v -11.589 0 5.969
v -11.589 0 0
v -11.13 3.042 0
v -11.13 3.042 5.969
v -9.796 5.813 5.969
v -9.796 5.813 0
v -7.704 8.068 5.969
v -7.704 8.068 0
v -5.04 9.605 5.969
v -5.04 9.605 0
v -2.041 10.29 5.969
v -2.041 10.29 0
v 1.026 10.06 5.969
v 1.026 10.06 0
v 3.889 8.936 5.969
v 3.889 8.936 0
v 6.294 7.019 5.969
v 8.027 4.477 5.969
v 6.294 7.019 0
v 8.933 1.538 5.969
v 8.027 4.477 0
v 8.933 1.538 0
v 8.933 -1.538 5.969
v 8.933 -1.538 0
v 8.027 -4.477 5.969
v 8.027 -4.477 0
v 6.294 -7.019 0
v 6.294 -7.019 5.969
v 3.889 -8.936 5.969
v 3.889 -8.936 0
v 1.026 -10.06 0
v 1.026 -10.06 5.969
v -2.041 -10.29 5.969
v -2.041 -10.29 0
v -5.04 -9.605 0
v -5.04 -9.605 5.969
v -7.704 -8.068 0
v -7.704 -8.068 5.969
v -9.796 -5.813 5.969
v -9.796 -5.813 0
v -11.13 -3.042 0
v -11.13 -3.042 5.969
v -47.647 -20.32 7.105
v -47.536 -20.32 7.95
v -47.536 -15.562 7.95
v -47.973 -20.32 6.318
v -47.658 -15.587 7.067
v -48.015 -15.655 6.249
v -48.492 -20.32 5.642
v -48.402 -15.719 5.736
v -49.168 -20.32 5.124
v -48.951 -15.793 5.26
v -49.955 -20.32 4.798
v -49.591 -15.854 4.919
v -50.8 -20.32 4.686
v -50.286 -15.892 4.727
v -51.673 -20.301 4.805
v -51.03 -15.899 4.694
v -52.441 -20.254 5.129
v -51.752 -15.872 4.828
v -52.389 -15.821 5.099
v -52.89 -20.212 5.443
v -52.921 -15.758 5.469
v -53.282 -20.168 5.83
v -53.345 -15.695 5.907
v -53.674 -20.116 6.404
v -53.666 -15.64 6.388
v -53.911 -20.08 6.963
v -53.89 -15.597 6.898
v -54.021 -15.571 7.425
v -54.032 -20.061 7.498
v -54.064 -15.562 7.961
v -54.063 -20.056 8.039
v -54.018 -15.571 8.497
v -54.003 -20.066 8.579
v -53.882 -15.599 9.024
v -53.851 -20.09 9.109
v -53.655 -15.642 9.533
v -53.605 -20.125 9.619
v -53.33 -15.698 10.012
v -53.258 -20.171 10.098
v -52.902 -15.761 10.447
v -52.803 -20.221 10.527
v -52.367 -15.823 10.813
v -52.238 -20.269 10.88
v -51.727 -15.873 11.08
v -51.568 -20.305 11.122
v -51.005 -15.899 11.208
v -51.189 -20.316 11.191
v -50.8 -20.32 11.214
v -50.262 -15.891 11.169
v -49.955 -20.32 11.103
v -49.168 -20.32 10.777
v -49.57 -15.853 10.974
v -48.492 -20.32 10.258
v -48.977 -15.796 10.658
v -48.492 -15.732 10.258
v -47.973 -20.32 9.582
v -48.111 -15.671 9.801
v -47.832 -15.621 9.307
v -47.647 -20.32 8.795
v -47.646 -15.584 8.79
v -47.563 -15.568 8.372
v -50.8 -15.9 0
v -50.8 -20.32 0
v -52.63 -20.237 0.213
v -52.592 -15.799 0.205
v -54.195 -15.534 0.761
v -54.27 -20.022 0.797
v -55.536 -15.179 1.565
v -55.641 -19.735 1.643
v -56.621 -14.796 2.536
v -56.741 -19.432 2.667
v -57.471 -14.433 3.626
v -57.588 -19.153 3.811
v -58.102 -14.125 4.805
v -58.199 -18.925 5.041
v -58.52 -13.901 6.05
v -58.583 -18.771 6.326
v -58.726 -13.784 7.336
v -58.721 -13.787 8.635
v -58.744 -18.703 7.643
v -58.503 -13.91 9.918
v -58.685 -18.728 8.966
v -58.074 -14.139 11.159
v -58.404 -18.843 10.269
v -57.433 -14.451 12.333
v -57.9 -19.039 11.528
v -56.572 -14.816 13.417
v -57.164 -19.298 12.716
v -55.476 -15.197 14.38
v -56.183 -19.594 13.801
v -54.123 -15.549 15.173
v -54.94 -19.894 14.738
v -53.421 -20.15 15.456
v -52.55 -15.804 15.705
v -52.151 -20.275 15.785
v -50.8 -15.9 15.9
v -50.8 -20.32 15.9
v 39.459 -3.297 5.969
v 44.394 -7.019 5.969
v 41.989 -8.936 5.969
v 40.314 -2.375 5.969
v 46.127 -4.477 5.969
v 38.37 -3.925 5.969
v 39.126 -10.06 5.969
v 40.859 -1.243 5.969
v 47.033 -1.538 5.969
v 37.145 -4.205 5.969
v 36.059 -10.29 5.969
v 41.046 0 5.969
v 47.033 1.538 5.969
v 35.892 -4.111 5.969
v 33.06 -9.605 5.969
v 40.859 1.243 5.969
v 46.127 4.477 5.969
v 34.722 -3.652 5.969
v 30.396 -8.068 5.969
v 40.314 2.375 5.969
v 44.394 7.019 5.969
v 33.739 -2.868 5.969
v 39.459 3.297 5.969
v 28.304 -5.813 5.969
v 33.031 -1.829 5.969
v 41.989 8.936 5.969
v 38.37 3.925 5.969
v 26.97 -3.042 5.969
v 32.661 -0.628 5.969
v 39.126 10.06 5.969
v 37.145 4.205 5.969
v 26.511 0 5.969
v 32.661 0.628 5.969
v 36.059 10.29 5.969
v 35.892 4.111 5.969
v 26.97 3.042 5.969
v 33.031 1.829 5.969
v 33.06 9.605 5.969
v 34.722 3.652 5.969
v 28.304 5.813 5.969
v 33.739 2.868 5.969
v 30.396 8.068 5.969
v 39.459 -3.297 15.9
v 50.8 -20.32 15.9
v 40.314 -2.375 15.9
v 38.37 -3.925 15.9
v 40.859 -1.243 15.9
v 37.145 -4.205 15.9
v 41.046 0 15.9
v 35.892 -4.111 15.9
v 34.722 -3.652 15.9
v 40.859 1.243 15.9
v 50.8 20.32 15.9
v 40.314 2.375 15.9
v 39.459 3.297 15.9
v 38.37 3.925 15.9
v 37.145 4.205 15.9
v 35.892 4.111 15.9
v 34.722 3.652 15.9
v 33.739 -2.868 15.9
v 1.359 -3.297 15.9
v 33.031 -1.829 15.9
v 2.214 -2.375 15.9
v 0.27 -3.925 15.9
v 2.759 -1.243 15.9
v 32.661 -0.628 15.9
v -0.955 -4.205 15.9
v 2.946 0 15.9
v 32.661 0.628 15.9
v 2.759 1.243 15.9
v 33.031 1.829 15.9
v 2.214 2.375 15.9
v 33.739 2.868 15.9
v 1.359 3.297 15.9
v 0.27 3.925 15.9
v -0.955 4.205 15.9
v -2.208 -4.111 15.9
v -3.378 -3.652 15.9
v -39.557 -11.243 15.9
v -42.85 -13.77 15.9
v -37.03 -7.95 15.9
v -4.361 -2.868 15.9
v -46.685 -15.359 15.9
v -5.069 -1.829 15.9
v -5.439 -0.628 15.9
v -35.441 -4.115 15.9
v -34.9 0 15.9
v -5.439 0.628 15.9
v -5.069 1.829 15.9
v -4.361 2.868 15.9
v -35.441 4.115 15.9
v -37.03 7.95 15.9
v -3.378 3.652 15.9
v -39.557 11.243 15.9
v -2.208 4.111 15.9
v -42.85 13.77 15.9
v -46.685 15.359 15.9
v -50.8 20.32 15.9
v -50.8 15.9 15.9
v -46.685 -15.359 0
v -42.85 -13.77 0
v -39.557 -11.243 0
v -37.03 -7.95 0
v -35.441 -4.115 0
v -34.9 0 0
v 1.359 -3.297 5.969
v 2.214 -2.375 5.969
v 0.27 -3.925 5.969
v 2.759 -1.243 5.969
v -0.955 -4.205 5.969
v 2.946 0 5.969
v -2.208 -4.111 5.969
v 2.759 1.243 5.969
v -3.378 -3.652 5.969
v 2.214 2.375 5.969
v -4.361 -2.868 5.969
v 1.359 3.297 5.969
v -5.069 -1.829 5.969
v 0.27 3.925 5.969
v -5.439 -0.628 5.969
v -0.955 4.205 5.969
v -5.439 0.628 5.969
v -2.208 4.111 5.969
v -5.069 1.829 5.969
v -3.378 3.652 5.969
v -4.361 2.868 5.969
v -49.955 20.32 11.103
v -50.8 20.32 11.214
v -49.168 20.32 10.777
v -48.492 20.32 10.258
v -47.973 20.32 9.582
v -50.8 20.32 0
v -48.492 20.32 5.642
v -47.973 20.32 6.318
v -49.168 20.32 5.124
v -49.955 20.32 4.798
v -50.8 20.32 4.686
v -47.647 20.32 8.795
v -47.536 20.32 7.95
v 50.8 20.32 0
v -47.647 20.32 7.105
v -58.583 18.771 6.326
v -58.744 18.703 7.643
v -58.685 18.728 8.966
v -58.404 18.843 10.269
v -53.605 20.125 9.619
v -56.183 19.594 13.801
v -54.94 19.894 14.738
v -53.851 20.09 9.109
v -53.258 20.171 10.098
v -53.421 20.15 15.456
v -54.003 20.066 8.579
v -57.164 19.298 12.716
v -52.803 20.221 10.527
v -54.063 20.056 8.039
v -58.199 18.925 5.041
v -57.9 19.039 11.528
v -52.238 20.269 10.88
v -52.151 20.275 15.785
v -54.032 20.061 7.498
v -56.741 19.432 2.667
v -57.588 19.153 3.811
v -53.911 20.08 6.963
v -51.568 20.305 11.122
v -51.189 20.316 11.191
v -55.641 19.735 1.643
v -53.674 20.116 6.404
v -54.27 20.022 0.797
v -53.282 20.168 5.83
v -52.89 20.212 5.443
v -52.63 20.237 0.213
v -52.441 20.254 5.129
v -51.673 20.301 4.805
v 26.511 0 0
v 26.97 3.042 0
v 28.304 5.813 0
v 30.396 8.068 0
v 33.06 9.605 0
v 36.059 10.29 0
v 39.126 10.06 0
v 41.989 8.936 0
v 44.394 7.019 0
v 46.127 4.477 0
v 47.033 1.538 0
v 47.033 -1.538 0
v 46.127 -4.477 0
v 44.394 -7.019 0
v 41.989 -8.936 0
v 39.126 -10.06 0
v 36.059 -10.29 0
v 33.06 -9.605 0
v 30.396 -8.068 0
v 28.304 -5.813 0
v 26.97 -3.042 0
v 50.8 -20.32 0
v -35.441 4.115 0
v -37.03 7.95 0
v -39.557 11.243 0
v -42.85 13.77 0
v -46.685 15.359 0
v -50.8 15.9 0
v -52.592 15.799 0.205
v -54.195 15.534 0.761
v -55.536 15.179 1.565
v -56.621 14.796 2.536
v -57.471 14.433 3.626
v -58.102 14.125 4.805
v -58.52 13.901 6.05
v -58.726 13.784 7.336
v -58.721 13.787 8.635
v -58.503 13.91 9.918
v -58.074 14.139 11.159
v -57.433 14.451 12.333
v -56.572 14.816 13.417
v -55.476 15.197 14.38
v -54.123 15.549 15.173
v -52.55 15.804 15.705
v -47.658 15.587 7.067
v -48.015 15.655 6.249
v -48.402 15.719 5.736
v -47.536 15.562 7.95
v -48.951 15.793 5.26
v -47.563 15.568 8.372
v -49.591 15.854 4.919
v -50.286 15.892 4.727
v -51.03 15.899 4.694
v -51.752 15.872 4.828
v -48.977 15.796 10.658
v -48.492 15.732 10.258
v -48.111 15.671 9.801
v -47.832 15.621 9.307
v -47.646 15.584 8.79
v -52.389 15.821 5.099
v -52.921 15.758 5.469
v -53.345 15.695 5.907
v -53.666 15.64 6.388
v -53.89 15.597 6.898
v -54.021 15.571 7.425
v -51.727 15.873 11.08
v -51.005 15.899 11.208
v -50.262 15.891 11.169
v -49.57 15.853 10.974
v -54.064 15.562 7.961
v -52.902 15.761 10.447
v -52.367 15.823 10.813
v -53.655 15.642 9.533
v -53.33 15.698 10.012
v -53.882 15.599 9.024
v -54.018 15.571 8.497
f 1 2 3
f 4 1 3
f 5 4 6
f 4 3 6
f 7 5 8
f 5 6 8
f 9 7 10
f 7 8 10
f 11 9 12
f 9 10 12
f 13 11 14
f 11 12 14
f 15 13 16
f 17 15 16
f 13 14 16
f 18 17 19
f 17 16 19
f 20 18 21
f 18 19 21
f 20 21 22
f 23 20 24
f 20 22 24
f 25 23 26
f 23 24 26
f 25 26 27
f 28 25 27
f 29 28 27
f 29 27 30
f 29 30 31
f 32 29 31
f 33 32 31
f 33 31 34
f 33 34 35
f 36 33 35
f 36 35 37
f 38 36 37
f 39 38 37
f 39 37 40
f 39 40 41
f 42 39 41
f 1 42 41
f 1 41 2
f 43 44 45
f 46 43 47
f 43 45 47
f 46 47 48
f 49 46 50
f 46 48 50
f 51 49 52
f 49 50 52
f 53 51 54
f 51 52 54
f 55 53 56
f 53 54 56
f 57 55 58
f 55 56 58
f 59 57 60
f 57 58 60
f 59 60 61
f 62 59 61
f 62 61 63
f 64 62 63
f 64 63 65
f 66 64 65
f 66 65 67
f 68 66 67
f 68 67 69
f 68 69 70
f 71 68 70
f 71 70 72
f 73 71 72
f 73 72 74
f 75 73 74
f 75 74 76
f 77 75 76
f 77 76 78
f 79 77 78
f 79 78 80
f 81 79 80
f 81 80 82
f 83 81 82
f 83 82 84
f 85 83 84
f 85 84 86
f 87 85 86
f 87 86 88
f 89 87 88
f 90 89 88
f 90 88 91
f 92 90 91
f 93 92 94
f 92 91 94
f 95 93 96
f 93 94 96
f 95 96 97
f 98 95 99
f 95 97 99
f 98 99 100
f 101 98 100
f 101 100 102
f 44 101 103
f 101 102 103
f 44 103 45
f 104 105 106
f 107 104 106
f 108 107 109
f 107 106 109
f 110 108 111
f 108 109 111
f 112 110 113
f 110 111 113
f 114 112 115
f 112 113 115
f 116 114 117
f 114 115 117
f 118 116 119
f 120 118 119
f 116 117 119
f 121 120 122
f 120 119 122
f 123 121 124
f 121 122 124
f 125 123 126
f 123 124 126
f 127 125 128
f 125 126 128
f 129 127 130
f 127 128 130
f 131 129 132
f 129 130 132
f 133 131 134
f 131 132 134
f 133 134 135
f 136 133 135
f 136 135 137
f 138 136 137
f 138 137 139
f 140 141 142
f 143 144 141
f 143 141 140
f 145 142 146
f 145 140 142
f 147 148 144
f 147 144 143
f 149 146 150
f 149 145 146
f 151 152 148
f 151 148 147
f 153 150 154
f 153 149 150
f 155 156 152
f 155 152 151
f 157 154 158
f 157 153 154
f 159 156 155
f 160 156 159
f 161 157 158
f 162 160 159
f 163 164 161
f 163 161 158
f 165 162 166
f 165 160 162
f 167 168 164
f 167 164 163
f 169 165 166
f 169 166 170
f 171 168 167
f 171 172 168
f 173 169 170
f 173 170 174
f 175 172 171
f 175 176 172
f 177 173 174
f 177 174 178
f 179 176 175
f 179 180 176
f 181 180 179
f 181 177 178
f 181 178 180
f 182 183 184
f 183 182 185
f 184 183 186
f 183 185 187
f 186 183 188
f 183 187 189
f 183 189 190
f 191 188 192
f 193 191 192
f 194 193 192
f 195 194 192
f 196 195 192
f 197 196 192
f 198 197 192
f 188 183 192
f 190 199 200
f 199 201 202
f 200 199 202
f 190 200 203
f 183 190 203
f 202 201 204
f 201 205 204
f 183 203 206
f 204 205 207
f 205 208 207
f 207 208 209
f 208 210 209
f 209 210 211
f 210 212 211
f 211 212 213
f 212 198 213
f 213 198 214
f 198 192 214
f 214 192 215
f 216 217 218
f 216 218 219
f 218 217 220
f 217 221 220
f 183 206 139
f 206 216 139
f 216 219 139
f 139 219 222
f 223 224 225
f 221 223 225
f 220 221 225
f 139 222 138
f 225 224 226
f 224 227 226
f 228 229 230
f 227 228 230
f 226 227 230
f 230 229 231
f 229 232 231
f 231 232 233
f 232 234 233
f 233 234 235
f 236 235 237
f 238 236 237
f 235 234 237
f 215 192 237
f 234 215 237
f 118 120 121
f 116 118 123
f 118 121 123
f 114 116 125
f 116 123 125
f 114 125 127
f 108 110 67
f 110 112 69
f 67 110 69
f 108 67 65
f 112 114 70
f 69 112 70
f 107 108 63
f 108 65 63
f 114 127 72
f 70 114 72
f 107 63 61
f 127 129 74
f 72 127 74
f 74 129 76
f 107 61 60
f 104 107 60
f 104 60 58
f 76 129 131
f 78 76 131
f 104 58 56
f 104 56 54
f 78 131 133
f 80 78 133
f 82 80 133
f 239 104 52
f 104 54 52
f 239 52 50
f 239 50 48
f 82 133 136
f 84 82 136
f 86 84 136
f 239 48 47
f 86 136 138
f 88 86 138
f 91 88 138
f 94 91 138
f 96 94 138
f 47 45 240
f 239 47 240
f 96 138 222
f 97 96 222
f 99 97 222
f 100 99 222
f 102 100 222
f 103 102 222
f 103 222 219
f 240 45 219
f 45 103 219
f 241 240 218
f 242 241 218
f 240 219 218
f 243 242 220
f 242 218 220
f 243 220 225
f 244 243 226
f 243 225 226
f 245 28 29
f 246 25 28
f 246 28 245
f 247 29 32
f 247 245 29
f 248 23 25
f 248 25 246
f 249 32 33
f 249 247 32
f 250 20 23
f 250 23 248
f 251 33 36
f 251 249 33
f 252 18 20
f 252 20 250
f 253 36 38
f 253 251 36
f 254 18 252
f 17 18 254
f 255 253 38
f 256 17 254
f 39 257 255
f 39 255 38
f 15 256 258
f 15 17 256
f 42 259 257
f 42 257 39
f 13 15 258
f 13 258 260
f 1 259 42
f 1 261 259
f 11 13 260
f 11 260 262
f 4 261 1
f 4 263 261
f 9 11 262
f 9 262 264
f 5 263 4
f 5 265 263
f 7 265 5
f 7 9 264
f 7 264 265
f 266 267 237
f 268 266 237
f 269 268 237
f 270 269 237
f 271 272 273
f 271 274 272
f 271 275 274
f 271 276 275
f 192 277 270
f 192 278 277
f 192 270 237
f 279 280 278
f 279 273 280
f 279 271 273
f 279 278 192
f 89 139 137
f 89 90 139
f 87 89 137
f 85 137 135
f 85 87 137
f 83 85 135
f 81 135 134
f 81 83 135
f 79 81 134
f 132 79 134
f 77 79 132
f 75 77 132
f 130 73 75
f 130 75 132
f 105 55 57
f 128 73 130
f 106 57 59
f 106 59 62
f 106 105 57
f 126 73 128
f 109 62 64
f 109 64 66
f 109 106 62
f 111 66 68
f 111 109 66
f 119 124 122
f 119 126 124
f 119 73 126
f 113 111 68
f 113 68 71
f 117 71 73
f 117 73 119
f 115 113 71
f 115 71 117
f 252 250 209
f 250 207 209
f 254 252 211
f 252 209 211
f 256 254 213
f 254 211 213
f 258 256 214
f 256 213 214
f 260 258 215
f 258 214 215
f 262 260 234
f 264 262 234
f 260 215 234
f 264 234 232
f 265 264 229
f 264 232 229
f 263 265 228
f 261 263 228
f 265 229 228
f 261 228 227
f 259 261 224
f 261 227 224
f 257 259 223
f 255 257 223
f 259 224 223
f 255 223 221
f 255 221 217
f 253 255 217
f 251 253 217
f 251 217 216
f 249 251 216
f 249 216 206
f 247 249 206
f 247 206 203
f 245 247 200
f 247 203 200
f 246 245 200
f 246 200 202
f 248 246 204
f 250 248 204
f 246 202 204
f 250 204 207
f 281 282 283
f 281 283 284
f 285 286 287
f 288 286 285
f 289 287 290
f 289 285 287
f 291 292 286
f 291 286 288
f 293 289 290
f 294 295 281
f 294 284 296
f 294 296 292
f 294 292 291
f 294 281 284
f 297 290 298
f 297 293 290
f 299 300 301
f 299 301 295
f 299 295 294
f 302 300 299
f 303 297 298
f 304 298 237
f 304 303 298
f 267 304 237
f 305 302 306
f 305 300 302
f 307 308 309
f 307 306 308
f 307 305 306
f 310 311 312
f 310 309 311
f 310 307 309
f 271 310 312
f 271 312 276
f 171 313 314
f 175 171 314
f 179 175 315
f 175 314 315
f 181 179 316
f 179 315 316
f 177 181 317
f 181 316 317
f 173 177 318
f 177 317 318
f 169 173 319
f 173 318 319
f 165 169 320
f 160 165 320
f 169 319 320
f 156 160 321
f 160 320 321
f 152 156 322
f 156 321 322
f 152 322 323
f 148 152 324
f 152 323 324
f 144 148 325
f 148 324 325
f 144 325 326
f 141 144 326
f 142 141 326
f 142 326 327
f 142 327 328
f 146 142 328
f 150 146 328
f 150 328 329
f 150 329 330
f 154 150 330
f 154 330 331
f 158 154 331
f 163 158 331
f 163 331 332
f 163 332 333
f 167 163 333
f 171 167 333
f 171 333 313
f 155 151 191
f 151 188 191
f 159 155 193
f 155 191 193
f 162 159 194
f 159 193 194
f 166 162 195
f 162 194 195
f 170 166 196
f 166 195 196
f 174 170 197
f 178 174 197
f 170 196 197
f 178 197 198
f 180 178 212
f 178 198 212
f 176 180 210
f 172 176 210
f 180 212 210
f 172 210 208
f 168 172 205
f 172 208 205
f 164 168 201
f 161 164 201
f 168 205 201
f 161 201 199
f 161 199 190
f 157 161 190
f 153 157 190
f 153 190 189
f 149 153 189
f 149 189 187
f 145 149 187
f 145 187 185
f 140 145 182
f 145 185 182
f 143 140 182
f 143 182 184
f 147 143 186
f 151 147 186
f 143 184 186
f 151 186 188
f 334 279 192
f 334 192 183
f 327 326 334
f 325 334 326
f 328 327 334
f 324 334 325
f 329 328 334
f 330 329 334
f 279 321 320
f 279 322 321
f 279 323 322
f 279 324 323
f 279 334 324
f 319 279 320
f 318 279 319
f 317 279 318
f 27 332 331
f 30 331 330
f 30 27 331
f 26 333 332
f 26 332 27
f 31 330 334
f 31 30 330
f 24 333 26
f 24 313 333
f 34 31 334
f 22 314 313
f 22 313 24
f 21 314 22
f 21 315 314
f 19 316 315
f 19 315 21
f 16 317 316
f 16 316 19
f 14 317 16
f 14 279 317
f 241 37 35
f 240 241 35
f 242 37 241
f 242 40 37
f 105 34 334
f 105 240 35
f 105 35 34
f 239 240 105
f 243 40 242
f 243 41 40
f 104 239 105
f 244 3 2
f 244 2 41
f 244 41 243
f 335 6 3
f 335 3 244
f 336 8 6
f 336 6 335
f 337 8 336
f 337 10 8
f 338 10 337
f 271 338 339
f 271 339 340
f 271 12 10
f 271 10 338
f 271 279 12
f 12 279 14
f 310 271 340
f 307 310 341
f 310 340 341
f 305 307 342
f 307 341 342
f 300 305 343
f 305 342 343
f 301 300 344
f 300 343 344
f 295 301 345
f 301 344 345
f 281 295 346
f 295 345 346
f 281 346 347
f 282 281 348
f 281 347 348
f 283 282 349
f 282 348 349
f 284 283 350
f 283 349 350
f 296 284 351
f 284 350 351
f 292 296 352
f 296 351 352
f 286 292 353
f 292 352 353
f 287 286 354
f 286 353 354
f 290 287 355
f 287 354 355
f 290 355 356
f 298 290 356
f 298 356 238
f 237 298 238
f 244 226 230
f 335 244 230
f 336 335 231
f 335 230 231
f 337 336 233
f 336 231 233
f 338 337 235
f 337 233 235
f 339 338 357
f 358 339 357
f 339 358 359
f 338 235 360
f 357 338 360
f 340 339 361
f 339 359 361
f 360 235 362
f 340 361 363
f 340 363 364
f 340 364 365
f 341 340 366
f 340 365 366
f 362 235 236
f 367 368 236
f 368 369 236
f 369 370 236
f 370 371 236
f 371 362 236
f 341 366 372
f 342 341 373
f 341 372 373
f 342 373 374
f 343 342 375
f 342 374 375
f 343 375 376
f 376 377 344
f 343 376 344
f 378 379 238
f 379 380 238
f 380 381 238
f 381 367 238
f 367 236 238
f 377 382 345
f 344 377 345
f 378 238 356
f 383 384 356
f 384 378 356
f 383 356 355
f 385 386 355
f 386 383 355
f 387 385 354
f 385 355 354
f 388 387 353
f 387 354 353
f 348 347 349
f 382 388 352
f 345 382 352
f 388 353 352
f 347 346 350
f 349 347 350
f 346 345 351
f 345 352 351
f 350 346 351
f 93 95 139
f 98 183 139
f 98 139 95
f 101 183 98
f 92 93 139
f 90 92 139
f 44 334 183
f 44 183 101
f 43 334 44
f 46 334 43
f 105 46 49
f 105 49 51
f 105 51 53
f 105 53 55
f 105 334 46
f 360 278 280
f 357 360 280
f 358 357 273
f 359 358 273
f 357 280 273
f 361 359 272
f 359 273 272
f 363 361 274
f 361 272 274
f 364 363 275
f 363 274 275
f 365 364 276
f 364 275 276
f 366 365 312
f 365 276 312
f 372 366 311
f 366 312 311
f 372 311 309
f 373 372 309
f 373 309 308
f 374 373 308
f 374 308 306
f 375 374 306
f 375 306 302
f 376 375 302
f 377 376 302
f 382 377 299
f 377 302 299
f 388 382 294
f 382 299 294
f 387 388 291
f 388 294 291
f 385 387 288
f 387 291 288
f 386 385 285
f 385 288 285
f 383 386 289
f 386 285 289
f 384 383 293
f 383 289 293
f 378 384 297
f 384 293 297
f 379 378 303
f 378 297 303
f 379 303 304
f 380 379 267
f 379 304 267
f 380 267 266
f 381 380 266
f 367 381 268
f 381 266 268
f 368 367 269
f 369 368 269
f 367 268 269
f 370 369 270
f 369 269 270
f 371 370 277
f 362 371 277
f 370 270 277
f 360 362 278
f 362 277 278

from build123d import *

# Parameters (mm, degrees)
BOSS_EXTRUDE1_DEPTH                       = 15.9004
SKETCH2_R                                 = 15.9004
CUT_EXTRUDE1_DEPTH                        = 2.54
CUT_EXTRUDE1_DEPTH_BACK                   = 18.796
CBORE_FOR_5_16_HEX_HEAD_BOLT1_D           = 8.4328
CBORE_FOR_5_16_HEX_HEAD_BOLT1_CBORE_D     = 20.6375
CBORE_FOR_5_16_HEX_HEAD_BOLT1_CBORE_DEPTH = 5.969
F_5_16_18_TAPPED_HOLE1_D                  = 6.5278
CUT_EXTRUDE2_DEPTH                        = 40.894


with BuildPart() as part:
    # Sketch1 → Boss-Extrude1 (new body)
    with BuildSketch(Plane.XY):
        with BuildLine():
            Line((50.8, -20.32), (-50.8, -20.32))
            ThreePointArc((-50.8, -20.32), (-71.12, 0), (-50.8, 20.32))
            Line((-50.8, 20.32), (50.8, 20.32))
            Line((50.8, 20.32), (50.8, -20.32))
        make_face()
    extrude(amount=BOSS_EXTRUDE1_DEPTH)

    # Sketch2 → Cut-Extrude1 (cut, two sides)
    with BuildSketch(Plane(origin=(2.48157472, 0, 15.9004), x_dir=(1, 0, 0), z_dir=(0, 0, 1))) as cut_extrude1_sk:
        with Locations((-53.28157472, 0)):
            Circle(SKETCH2_R)
    extrude(amount=CUT_EXTRUDE1_DEPTH, mode=Mode.SUBTRACT)
    extrude(cut_extrude1_sk.sketch, amount=-CUT_EXTRUDE1_DEPTH_BACK, mode=Mode.SUBTRACT)

    # CBORE for 5/16 Hex Head Bolt1 (through all)
    with Locations(Plane(origin=(0, 0, 0), x_dir=(-1, 0, 0), z_dir=(0, 0, -1))):
        with Locations((-36.83, 0), (1.27, 0)):
            CounterBoreHole(CBORE_FOR_5_16_HEX_HEAD_BOLT1_D / 2, CBORE_FOR_5_16_HEX_HEAD_BOLT1_CBORE_D / 2, CBORE_FOR_5_16_HEX_HEAD_BOLT1_CBORE_DEPTH)

    # 5/16-18 Tapped Hole1 (through all)
    with Locations(Plane(origin=(0, -20.32, 0), x_dir=(-1, 0, 0), z_dir=(0, -1, 0))):
        with Locations((50.8, -7.9502)):
            Hole(F_5_16_18_TAPPED_HOLE1_D / 2)

    # Sketch10 → Cut-Extrude2 (cut)
    with BuildSketch(Plane.XZ.offset(20.32)):
        with BuildLine():
            Line((-50.8, 15.9004), (-71.468119006, 15.9004))
            Line((-71.468119006, 15.9004), (-71.468119006, 0))
            Line((-71.468119006, 0), (-50.8, 0))
            ThreePointArc((-50.8, 0), (-58.7502, 7.9502), (-50.8, 15.9004))
        make_face()
    extrude(amount=-CUT_EXTRUDE2_DEPTH, mode=Mode.SUBTRACT)


solid = part.part
